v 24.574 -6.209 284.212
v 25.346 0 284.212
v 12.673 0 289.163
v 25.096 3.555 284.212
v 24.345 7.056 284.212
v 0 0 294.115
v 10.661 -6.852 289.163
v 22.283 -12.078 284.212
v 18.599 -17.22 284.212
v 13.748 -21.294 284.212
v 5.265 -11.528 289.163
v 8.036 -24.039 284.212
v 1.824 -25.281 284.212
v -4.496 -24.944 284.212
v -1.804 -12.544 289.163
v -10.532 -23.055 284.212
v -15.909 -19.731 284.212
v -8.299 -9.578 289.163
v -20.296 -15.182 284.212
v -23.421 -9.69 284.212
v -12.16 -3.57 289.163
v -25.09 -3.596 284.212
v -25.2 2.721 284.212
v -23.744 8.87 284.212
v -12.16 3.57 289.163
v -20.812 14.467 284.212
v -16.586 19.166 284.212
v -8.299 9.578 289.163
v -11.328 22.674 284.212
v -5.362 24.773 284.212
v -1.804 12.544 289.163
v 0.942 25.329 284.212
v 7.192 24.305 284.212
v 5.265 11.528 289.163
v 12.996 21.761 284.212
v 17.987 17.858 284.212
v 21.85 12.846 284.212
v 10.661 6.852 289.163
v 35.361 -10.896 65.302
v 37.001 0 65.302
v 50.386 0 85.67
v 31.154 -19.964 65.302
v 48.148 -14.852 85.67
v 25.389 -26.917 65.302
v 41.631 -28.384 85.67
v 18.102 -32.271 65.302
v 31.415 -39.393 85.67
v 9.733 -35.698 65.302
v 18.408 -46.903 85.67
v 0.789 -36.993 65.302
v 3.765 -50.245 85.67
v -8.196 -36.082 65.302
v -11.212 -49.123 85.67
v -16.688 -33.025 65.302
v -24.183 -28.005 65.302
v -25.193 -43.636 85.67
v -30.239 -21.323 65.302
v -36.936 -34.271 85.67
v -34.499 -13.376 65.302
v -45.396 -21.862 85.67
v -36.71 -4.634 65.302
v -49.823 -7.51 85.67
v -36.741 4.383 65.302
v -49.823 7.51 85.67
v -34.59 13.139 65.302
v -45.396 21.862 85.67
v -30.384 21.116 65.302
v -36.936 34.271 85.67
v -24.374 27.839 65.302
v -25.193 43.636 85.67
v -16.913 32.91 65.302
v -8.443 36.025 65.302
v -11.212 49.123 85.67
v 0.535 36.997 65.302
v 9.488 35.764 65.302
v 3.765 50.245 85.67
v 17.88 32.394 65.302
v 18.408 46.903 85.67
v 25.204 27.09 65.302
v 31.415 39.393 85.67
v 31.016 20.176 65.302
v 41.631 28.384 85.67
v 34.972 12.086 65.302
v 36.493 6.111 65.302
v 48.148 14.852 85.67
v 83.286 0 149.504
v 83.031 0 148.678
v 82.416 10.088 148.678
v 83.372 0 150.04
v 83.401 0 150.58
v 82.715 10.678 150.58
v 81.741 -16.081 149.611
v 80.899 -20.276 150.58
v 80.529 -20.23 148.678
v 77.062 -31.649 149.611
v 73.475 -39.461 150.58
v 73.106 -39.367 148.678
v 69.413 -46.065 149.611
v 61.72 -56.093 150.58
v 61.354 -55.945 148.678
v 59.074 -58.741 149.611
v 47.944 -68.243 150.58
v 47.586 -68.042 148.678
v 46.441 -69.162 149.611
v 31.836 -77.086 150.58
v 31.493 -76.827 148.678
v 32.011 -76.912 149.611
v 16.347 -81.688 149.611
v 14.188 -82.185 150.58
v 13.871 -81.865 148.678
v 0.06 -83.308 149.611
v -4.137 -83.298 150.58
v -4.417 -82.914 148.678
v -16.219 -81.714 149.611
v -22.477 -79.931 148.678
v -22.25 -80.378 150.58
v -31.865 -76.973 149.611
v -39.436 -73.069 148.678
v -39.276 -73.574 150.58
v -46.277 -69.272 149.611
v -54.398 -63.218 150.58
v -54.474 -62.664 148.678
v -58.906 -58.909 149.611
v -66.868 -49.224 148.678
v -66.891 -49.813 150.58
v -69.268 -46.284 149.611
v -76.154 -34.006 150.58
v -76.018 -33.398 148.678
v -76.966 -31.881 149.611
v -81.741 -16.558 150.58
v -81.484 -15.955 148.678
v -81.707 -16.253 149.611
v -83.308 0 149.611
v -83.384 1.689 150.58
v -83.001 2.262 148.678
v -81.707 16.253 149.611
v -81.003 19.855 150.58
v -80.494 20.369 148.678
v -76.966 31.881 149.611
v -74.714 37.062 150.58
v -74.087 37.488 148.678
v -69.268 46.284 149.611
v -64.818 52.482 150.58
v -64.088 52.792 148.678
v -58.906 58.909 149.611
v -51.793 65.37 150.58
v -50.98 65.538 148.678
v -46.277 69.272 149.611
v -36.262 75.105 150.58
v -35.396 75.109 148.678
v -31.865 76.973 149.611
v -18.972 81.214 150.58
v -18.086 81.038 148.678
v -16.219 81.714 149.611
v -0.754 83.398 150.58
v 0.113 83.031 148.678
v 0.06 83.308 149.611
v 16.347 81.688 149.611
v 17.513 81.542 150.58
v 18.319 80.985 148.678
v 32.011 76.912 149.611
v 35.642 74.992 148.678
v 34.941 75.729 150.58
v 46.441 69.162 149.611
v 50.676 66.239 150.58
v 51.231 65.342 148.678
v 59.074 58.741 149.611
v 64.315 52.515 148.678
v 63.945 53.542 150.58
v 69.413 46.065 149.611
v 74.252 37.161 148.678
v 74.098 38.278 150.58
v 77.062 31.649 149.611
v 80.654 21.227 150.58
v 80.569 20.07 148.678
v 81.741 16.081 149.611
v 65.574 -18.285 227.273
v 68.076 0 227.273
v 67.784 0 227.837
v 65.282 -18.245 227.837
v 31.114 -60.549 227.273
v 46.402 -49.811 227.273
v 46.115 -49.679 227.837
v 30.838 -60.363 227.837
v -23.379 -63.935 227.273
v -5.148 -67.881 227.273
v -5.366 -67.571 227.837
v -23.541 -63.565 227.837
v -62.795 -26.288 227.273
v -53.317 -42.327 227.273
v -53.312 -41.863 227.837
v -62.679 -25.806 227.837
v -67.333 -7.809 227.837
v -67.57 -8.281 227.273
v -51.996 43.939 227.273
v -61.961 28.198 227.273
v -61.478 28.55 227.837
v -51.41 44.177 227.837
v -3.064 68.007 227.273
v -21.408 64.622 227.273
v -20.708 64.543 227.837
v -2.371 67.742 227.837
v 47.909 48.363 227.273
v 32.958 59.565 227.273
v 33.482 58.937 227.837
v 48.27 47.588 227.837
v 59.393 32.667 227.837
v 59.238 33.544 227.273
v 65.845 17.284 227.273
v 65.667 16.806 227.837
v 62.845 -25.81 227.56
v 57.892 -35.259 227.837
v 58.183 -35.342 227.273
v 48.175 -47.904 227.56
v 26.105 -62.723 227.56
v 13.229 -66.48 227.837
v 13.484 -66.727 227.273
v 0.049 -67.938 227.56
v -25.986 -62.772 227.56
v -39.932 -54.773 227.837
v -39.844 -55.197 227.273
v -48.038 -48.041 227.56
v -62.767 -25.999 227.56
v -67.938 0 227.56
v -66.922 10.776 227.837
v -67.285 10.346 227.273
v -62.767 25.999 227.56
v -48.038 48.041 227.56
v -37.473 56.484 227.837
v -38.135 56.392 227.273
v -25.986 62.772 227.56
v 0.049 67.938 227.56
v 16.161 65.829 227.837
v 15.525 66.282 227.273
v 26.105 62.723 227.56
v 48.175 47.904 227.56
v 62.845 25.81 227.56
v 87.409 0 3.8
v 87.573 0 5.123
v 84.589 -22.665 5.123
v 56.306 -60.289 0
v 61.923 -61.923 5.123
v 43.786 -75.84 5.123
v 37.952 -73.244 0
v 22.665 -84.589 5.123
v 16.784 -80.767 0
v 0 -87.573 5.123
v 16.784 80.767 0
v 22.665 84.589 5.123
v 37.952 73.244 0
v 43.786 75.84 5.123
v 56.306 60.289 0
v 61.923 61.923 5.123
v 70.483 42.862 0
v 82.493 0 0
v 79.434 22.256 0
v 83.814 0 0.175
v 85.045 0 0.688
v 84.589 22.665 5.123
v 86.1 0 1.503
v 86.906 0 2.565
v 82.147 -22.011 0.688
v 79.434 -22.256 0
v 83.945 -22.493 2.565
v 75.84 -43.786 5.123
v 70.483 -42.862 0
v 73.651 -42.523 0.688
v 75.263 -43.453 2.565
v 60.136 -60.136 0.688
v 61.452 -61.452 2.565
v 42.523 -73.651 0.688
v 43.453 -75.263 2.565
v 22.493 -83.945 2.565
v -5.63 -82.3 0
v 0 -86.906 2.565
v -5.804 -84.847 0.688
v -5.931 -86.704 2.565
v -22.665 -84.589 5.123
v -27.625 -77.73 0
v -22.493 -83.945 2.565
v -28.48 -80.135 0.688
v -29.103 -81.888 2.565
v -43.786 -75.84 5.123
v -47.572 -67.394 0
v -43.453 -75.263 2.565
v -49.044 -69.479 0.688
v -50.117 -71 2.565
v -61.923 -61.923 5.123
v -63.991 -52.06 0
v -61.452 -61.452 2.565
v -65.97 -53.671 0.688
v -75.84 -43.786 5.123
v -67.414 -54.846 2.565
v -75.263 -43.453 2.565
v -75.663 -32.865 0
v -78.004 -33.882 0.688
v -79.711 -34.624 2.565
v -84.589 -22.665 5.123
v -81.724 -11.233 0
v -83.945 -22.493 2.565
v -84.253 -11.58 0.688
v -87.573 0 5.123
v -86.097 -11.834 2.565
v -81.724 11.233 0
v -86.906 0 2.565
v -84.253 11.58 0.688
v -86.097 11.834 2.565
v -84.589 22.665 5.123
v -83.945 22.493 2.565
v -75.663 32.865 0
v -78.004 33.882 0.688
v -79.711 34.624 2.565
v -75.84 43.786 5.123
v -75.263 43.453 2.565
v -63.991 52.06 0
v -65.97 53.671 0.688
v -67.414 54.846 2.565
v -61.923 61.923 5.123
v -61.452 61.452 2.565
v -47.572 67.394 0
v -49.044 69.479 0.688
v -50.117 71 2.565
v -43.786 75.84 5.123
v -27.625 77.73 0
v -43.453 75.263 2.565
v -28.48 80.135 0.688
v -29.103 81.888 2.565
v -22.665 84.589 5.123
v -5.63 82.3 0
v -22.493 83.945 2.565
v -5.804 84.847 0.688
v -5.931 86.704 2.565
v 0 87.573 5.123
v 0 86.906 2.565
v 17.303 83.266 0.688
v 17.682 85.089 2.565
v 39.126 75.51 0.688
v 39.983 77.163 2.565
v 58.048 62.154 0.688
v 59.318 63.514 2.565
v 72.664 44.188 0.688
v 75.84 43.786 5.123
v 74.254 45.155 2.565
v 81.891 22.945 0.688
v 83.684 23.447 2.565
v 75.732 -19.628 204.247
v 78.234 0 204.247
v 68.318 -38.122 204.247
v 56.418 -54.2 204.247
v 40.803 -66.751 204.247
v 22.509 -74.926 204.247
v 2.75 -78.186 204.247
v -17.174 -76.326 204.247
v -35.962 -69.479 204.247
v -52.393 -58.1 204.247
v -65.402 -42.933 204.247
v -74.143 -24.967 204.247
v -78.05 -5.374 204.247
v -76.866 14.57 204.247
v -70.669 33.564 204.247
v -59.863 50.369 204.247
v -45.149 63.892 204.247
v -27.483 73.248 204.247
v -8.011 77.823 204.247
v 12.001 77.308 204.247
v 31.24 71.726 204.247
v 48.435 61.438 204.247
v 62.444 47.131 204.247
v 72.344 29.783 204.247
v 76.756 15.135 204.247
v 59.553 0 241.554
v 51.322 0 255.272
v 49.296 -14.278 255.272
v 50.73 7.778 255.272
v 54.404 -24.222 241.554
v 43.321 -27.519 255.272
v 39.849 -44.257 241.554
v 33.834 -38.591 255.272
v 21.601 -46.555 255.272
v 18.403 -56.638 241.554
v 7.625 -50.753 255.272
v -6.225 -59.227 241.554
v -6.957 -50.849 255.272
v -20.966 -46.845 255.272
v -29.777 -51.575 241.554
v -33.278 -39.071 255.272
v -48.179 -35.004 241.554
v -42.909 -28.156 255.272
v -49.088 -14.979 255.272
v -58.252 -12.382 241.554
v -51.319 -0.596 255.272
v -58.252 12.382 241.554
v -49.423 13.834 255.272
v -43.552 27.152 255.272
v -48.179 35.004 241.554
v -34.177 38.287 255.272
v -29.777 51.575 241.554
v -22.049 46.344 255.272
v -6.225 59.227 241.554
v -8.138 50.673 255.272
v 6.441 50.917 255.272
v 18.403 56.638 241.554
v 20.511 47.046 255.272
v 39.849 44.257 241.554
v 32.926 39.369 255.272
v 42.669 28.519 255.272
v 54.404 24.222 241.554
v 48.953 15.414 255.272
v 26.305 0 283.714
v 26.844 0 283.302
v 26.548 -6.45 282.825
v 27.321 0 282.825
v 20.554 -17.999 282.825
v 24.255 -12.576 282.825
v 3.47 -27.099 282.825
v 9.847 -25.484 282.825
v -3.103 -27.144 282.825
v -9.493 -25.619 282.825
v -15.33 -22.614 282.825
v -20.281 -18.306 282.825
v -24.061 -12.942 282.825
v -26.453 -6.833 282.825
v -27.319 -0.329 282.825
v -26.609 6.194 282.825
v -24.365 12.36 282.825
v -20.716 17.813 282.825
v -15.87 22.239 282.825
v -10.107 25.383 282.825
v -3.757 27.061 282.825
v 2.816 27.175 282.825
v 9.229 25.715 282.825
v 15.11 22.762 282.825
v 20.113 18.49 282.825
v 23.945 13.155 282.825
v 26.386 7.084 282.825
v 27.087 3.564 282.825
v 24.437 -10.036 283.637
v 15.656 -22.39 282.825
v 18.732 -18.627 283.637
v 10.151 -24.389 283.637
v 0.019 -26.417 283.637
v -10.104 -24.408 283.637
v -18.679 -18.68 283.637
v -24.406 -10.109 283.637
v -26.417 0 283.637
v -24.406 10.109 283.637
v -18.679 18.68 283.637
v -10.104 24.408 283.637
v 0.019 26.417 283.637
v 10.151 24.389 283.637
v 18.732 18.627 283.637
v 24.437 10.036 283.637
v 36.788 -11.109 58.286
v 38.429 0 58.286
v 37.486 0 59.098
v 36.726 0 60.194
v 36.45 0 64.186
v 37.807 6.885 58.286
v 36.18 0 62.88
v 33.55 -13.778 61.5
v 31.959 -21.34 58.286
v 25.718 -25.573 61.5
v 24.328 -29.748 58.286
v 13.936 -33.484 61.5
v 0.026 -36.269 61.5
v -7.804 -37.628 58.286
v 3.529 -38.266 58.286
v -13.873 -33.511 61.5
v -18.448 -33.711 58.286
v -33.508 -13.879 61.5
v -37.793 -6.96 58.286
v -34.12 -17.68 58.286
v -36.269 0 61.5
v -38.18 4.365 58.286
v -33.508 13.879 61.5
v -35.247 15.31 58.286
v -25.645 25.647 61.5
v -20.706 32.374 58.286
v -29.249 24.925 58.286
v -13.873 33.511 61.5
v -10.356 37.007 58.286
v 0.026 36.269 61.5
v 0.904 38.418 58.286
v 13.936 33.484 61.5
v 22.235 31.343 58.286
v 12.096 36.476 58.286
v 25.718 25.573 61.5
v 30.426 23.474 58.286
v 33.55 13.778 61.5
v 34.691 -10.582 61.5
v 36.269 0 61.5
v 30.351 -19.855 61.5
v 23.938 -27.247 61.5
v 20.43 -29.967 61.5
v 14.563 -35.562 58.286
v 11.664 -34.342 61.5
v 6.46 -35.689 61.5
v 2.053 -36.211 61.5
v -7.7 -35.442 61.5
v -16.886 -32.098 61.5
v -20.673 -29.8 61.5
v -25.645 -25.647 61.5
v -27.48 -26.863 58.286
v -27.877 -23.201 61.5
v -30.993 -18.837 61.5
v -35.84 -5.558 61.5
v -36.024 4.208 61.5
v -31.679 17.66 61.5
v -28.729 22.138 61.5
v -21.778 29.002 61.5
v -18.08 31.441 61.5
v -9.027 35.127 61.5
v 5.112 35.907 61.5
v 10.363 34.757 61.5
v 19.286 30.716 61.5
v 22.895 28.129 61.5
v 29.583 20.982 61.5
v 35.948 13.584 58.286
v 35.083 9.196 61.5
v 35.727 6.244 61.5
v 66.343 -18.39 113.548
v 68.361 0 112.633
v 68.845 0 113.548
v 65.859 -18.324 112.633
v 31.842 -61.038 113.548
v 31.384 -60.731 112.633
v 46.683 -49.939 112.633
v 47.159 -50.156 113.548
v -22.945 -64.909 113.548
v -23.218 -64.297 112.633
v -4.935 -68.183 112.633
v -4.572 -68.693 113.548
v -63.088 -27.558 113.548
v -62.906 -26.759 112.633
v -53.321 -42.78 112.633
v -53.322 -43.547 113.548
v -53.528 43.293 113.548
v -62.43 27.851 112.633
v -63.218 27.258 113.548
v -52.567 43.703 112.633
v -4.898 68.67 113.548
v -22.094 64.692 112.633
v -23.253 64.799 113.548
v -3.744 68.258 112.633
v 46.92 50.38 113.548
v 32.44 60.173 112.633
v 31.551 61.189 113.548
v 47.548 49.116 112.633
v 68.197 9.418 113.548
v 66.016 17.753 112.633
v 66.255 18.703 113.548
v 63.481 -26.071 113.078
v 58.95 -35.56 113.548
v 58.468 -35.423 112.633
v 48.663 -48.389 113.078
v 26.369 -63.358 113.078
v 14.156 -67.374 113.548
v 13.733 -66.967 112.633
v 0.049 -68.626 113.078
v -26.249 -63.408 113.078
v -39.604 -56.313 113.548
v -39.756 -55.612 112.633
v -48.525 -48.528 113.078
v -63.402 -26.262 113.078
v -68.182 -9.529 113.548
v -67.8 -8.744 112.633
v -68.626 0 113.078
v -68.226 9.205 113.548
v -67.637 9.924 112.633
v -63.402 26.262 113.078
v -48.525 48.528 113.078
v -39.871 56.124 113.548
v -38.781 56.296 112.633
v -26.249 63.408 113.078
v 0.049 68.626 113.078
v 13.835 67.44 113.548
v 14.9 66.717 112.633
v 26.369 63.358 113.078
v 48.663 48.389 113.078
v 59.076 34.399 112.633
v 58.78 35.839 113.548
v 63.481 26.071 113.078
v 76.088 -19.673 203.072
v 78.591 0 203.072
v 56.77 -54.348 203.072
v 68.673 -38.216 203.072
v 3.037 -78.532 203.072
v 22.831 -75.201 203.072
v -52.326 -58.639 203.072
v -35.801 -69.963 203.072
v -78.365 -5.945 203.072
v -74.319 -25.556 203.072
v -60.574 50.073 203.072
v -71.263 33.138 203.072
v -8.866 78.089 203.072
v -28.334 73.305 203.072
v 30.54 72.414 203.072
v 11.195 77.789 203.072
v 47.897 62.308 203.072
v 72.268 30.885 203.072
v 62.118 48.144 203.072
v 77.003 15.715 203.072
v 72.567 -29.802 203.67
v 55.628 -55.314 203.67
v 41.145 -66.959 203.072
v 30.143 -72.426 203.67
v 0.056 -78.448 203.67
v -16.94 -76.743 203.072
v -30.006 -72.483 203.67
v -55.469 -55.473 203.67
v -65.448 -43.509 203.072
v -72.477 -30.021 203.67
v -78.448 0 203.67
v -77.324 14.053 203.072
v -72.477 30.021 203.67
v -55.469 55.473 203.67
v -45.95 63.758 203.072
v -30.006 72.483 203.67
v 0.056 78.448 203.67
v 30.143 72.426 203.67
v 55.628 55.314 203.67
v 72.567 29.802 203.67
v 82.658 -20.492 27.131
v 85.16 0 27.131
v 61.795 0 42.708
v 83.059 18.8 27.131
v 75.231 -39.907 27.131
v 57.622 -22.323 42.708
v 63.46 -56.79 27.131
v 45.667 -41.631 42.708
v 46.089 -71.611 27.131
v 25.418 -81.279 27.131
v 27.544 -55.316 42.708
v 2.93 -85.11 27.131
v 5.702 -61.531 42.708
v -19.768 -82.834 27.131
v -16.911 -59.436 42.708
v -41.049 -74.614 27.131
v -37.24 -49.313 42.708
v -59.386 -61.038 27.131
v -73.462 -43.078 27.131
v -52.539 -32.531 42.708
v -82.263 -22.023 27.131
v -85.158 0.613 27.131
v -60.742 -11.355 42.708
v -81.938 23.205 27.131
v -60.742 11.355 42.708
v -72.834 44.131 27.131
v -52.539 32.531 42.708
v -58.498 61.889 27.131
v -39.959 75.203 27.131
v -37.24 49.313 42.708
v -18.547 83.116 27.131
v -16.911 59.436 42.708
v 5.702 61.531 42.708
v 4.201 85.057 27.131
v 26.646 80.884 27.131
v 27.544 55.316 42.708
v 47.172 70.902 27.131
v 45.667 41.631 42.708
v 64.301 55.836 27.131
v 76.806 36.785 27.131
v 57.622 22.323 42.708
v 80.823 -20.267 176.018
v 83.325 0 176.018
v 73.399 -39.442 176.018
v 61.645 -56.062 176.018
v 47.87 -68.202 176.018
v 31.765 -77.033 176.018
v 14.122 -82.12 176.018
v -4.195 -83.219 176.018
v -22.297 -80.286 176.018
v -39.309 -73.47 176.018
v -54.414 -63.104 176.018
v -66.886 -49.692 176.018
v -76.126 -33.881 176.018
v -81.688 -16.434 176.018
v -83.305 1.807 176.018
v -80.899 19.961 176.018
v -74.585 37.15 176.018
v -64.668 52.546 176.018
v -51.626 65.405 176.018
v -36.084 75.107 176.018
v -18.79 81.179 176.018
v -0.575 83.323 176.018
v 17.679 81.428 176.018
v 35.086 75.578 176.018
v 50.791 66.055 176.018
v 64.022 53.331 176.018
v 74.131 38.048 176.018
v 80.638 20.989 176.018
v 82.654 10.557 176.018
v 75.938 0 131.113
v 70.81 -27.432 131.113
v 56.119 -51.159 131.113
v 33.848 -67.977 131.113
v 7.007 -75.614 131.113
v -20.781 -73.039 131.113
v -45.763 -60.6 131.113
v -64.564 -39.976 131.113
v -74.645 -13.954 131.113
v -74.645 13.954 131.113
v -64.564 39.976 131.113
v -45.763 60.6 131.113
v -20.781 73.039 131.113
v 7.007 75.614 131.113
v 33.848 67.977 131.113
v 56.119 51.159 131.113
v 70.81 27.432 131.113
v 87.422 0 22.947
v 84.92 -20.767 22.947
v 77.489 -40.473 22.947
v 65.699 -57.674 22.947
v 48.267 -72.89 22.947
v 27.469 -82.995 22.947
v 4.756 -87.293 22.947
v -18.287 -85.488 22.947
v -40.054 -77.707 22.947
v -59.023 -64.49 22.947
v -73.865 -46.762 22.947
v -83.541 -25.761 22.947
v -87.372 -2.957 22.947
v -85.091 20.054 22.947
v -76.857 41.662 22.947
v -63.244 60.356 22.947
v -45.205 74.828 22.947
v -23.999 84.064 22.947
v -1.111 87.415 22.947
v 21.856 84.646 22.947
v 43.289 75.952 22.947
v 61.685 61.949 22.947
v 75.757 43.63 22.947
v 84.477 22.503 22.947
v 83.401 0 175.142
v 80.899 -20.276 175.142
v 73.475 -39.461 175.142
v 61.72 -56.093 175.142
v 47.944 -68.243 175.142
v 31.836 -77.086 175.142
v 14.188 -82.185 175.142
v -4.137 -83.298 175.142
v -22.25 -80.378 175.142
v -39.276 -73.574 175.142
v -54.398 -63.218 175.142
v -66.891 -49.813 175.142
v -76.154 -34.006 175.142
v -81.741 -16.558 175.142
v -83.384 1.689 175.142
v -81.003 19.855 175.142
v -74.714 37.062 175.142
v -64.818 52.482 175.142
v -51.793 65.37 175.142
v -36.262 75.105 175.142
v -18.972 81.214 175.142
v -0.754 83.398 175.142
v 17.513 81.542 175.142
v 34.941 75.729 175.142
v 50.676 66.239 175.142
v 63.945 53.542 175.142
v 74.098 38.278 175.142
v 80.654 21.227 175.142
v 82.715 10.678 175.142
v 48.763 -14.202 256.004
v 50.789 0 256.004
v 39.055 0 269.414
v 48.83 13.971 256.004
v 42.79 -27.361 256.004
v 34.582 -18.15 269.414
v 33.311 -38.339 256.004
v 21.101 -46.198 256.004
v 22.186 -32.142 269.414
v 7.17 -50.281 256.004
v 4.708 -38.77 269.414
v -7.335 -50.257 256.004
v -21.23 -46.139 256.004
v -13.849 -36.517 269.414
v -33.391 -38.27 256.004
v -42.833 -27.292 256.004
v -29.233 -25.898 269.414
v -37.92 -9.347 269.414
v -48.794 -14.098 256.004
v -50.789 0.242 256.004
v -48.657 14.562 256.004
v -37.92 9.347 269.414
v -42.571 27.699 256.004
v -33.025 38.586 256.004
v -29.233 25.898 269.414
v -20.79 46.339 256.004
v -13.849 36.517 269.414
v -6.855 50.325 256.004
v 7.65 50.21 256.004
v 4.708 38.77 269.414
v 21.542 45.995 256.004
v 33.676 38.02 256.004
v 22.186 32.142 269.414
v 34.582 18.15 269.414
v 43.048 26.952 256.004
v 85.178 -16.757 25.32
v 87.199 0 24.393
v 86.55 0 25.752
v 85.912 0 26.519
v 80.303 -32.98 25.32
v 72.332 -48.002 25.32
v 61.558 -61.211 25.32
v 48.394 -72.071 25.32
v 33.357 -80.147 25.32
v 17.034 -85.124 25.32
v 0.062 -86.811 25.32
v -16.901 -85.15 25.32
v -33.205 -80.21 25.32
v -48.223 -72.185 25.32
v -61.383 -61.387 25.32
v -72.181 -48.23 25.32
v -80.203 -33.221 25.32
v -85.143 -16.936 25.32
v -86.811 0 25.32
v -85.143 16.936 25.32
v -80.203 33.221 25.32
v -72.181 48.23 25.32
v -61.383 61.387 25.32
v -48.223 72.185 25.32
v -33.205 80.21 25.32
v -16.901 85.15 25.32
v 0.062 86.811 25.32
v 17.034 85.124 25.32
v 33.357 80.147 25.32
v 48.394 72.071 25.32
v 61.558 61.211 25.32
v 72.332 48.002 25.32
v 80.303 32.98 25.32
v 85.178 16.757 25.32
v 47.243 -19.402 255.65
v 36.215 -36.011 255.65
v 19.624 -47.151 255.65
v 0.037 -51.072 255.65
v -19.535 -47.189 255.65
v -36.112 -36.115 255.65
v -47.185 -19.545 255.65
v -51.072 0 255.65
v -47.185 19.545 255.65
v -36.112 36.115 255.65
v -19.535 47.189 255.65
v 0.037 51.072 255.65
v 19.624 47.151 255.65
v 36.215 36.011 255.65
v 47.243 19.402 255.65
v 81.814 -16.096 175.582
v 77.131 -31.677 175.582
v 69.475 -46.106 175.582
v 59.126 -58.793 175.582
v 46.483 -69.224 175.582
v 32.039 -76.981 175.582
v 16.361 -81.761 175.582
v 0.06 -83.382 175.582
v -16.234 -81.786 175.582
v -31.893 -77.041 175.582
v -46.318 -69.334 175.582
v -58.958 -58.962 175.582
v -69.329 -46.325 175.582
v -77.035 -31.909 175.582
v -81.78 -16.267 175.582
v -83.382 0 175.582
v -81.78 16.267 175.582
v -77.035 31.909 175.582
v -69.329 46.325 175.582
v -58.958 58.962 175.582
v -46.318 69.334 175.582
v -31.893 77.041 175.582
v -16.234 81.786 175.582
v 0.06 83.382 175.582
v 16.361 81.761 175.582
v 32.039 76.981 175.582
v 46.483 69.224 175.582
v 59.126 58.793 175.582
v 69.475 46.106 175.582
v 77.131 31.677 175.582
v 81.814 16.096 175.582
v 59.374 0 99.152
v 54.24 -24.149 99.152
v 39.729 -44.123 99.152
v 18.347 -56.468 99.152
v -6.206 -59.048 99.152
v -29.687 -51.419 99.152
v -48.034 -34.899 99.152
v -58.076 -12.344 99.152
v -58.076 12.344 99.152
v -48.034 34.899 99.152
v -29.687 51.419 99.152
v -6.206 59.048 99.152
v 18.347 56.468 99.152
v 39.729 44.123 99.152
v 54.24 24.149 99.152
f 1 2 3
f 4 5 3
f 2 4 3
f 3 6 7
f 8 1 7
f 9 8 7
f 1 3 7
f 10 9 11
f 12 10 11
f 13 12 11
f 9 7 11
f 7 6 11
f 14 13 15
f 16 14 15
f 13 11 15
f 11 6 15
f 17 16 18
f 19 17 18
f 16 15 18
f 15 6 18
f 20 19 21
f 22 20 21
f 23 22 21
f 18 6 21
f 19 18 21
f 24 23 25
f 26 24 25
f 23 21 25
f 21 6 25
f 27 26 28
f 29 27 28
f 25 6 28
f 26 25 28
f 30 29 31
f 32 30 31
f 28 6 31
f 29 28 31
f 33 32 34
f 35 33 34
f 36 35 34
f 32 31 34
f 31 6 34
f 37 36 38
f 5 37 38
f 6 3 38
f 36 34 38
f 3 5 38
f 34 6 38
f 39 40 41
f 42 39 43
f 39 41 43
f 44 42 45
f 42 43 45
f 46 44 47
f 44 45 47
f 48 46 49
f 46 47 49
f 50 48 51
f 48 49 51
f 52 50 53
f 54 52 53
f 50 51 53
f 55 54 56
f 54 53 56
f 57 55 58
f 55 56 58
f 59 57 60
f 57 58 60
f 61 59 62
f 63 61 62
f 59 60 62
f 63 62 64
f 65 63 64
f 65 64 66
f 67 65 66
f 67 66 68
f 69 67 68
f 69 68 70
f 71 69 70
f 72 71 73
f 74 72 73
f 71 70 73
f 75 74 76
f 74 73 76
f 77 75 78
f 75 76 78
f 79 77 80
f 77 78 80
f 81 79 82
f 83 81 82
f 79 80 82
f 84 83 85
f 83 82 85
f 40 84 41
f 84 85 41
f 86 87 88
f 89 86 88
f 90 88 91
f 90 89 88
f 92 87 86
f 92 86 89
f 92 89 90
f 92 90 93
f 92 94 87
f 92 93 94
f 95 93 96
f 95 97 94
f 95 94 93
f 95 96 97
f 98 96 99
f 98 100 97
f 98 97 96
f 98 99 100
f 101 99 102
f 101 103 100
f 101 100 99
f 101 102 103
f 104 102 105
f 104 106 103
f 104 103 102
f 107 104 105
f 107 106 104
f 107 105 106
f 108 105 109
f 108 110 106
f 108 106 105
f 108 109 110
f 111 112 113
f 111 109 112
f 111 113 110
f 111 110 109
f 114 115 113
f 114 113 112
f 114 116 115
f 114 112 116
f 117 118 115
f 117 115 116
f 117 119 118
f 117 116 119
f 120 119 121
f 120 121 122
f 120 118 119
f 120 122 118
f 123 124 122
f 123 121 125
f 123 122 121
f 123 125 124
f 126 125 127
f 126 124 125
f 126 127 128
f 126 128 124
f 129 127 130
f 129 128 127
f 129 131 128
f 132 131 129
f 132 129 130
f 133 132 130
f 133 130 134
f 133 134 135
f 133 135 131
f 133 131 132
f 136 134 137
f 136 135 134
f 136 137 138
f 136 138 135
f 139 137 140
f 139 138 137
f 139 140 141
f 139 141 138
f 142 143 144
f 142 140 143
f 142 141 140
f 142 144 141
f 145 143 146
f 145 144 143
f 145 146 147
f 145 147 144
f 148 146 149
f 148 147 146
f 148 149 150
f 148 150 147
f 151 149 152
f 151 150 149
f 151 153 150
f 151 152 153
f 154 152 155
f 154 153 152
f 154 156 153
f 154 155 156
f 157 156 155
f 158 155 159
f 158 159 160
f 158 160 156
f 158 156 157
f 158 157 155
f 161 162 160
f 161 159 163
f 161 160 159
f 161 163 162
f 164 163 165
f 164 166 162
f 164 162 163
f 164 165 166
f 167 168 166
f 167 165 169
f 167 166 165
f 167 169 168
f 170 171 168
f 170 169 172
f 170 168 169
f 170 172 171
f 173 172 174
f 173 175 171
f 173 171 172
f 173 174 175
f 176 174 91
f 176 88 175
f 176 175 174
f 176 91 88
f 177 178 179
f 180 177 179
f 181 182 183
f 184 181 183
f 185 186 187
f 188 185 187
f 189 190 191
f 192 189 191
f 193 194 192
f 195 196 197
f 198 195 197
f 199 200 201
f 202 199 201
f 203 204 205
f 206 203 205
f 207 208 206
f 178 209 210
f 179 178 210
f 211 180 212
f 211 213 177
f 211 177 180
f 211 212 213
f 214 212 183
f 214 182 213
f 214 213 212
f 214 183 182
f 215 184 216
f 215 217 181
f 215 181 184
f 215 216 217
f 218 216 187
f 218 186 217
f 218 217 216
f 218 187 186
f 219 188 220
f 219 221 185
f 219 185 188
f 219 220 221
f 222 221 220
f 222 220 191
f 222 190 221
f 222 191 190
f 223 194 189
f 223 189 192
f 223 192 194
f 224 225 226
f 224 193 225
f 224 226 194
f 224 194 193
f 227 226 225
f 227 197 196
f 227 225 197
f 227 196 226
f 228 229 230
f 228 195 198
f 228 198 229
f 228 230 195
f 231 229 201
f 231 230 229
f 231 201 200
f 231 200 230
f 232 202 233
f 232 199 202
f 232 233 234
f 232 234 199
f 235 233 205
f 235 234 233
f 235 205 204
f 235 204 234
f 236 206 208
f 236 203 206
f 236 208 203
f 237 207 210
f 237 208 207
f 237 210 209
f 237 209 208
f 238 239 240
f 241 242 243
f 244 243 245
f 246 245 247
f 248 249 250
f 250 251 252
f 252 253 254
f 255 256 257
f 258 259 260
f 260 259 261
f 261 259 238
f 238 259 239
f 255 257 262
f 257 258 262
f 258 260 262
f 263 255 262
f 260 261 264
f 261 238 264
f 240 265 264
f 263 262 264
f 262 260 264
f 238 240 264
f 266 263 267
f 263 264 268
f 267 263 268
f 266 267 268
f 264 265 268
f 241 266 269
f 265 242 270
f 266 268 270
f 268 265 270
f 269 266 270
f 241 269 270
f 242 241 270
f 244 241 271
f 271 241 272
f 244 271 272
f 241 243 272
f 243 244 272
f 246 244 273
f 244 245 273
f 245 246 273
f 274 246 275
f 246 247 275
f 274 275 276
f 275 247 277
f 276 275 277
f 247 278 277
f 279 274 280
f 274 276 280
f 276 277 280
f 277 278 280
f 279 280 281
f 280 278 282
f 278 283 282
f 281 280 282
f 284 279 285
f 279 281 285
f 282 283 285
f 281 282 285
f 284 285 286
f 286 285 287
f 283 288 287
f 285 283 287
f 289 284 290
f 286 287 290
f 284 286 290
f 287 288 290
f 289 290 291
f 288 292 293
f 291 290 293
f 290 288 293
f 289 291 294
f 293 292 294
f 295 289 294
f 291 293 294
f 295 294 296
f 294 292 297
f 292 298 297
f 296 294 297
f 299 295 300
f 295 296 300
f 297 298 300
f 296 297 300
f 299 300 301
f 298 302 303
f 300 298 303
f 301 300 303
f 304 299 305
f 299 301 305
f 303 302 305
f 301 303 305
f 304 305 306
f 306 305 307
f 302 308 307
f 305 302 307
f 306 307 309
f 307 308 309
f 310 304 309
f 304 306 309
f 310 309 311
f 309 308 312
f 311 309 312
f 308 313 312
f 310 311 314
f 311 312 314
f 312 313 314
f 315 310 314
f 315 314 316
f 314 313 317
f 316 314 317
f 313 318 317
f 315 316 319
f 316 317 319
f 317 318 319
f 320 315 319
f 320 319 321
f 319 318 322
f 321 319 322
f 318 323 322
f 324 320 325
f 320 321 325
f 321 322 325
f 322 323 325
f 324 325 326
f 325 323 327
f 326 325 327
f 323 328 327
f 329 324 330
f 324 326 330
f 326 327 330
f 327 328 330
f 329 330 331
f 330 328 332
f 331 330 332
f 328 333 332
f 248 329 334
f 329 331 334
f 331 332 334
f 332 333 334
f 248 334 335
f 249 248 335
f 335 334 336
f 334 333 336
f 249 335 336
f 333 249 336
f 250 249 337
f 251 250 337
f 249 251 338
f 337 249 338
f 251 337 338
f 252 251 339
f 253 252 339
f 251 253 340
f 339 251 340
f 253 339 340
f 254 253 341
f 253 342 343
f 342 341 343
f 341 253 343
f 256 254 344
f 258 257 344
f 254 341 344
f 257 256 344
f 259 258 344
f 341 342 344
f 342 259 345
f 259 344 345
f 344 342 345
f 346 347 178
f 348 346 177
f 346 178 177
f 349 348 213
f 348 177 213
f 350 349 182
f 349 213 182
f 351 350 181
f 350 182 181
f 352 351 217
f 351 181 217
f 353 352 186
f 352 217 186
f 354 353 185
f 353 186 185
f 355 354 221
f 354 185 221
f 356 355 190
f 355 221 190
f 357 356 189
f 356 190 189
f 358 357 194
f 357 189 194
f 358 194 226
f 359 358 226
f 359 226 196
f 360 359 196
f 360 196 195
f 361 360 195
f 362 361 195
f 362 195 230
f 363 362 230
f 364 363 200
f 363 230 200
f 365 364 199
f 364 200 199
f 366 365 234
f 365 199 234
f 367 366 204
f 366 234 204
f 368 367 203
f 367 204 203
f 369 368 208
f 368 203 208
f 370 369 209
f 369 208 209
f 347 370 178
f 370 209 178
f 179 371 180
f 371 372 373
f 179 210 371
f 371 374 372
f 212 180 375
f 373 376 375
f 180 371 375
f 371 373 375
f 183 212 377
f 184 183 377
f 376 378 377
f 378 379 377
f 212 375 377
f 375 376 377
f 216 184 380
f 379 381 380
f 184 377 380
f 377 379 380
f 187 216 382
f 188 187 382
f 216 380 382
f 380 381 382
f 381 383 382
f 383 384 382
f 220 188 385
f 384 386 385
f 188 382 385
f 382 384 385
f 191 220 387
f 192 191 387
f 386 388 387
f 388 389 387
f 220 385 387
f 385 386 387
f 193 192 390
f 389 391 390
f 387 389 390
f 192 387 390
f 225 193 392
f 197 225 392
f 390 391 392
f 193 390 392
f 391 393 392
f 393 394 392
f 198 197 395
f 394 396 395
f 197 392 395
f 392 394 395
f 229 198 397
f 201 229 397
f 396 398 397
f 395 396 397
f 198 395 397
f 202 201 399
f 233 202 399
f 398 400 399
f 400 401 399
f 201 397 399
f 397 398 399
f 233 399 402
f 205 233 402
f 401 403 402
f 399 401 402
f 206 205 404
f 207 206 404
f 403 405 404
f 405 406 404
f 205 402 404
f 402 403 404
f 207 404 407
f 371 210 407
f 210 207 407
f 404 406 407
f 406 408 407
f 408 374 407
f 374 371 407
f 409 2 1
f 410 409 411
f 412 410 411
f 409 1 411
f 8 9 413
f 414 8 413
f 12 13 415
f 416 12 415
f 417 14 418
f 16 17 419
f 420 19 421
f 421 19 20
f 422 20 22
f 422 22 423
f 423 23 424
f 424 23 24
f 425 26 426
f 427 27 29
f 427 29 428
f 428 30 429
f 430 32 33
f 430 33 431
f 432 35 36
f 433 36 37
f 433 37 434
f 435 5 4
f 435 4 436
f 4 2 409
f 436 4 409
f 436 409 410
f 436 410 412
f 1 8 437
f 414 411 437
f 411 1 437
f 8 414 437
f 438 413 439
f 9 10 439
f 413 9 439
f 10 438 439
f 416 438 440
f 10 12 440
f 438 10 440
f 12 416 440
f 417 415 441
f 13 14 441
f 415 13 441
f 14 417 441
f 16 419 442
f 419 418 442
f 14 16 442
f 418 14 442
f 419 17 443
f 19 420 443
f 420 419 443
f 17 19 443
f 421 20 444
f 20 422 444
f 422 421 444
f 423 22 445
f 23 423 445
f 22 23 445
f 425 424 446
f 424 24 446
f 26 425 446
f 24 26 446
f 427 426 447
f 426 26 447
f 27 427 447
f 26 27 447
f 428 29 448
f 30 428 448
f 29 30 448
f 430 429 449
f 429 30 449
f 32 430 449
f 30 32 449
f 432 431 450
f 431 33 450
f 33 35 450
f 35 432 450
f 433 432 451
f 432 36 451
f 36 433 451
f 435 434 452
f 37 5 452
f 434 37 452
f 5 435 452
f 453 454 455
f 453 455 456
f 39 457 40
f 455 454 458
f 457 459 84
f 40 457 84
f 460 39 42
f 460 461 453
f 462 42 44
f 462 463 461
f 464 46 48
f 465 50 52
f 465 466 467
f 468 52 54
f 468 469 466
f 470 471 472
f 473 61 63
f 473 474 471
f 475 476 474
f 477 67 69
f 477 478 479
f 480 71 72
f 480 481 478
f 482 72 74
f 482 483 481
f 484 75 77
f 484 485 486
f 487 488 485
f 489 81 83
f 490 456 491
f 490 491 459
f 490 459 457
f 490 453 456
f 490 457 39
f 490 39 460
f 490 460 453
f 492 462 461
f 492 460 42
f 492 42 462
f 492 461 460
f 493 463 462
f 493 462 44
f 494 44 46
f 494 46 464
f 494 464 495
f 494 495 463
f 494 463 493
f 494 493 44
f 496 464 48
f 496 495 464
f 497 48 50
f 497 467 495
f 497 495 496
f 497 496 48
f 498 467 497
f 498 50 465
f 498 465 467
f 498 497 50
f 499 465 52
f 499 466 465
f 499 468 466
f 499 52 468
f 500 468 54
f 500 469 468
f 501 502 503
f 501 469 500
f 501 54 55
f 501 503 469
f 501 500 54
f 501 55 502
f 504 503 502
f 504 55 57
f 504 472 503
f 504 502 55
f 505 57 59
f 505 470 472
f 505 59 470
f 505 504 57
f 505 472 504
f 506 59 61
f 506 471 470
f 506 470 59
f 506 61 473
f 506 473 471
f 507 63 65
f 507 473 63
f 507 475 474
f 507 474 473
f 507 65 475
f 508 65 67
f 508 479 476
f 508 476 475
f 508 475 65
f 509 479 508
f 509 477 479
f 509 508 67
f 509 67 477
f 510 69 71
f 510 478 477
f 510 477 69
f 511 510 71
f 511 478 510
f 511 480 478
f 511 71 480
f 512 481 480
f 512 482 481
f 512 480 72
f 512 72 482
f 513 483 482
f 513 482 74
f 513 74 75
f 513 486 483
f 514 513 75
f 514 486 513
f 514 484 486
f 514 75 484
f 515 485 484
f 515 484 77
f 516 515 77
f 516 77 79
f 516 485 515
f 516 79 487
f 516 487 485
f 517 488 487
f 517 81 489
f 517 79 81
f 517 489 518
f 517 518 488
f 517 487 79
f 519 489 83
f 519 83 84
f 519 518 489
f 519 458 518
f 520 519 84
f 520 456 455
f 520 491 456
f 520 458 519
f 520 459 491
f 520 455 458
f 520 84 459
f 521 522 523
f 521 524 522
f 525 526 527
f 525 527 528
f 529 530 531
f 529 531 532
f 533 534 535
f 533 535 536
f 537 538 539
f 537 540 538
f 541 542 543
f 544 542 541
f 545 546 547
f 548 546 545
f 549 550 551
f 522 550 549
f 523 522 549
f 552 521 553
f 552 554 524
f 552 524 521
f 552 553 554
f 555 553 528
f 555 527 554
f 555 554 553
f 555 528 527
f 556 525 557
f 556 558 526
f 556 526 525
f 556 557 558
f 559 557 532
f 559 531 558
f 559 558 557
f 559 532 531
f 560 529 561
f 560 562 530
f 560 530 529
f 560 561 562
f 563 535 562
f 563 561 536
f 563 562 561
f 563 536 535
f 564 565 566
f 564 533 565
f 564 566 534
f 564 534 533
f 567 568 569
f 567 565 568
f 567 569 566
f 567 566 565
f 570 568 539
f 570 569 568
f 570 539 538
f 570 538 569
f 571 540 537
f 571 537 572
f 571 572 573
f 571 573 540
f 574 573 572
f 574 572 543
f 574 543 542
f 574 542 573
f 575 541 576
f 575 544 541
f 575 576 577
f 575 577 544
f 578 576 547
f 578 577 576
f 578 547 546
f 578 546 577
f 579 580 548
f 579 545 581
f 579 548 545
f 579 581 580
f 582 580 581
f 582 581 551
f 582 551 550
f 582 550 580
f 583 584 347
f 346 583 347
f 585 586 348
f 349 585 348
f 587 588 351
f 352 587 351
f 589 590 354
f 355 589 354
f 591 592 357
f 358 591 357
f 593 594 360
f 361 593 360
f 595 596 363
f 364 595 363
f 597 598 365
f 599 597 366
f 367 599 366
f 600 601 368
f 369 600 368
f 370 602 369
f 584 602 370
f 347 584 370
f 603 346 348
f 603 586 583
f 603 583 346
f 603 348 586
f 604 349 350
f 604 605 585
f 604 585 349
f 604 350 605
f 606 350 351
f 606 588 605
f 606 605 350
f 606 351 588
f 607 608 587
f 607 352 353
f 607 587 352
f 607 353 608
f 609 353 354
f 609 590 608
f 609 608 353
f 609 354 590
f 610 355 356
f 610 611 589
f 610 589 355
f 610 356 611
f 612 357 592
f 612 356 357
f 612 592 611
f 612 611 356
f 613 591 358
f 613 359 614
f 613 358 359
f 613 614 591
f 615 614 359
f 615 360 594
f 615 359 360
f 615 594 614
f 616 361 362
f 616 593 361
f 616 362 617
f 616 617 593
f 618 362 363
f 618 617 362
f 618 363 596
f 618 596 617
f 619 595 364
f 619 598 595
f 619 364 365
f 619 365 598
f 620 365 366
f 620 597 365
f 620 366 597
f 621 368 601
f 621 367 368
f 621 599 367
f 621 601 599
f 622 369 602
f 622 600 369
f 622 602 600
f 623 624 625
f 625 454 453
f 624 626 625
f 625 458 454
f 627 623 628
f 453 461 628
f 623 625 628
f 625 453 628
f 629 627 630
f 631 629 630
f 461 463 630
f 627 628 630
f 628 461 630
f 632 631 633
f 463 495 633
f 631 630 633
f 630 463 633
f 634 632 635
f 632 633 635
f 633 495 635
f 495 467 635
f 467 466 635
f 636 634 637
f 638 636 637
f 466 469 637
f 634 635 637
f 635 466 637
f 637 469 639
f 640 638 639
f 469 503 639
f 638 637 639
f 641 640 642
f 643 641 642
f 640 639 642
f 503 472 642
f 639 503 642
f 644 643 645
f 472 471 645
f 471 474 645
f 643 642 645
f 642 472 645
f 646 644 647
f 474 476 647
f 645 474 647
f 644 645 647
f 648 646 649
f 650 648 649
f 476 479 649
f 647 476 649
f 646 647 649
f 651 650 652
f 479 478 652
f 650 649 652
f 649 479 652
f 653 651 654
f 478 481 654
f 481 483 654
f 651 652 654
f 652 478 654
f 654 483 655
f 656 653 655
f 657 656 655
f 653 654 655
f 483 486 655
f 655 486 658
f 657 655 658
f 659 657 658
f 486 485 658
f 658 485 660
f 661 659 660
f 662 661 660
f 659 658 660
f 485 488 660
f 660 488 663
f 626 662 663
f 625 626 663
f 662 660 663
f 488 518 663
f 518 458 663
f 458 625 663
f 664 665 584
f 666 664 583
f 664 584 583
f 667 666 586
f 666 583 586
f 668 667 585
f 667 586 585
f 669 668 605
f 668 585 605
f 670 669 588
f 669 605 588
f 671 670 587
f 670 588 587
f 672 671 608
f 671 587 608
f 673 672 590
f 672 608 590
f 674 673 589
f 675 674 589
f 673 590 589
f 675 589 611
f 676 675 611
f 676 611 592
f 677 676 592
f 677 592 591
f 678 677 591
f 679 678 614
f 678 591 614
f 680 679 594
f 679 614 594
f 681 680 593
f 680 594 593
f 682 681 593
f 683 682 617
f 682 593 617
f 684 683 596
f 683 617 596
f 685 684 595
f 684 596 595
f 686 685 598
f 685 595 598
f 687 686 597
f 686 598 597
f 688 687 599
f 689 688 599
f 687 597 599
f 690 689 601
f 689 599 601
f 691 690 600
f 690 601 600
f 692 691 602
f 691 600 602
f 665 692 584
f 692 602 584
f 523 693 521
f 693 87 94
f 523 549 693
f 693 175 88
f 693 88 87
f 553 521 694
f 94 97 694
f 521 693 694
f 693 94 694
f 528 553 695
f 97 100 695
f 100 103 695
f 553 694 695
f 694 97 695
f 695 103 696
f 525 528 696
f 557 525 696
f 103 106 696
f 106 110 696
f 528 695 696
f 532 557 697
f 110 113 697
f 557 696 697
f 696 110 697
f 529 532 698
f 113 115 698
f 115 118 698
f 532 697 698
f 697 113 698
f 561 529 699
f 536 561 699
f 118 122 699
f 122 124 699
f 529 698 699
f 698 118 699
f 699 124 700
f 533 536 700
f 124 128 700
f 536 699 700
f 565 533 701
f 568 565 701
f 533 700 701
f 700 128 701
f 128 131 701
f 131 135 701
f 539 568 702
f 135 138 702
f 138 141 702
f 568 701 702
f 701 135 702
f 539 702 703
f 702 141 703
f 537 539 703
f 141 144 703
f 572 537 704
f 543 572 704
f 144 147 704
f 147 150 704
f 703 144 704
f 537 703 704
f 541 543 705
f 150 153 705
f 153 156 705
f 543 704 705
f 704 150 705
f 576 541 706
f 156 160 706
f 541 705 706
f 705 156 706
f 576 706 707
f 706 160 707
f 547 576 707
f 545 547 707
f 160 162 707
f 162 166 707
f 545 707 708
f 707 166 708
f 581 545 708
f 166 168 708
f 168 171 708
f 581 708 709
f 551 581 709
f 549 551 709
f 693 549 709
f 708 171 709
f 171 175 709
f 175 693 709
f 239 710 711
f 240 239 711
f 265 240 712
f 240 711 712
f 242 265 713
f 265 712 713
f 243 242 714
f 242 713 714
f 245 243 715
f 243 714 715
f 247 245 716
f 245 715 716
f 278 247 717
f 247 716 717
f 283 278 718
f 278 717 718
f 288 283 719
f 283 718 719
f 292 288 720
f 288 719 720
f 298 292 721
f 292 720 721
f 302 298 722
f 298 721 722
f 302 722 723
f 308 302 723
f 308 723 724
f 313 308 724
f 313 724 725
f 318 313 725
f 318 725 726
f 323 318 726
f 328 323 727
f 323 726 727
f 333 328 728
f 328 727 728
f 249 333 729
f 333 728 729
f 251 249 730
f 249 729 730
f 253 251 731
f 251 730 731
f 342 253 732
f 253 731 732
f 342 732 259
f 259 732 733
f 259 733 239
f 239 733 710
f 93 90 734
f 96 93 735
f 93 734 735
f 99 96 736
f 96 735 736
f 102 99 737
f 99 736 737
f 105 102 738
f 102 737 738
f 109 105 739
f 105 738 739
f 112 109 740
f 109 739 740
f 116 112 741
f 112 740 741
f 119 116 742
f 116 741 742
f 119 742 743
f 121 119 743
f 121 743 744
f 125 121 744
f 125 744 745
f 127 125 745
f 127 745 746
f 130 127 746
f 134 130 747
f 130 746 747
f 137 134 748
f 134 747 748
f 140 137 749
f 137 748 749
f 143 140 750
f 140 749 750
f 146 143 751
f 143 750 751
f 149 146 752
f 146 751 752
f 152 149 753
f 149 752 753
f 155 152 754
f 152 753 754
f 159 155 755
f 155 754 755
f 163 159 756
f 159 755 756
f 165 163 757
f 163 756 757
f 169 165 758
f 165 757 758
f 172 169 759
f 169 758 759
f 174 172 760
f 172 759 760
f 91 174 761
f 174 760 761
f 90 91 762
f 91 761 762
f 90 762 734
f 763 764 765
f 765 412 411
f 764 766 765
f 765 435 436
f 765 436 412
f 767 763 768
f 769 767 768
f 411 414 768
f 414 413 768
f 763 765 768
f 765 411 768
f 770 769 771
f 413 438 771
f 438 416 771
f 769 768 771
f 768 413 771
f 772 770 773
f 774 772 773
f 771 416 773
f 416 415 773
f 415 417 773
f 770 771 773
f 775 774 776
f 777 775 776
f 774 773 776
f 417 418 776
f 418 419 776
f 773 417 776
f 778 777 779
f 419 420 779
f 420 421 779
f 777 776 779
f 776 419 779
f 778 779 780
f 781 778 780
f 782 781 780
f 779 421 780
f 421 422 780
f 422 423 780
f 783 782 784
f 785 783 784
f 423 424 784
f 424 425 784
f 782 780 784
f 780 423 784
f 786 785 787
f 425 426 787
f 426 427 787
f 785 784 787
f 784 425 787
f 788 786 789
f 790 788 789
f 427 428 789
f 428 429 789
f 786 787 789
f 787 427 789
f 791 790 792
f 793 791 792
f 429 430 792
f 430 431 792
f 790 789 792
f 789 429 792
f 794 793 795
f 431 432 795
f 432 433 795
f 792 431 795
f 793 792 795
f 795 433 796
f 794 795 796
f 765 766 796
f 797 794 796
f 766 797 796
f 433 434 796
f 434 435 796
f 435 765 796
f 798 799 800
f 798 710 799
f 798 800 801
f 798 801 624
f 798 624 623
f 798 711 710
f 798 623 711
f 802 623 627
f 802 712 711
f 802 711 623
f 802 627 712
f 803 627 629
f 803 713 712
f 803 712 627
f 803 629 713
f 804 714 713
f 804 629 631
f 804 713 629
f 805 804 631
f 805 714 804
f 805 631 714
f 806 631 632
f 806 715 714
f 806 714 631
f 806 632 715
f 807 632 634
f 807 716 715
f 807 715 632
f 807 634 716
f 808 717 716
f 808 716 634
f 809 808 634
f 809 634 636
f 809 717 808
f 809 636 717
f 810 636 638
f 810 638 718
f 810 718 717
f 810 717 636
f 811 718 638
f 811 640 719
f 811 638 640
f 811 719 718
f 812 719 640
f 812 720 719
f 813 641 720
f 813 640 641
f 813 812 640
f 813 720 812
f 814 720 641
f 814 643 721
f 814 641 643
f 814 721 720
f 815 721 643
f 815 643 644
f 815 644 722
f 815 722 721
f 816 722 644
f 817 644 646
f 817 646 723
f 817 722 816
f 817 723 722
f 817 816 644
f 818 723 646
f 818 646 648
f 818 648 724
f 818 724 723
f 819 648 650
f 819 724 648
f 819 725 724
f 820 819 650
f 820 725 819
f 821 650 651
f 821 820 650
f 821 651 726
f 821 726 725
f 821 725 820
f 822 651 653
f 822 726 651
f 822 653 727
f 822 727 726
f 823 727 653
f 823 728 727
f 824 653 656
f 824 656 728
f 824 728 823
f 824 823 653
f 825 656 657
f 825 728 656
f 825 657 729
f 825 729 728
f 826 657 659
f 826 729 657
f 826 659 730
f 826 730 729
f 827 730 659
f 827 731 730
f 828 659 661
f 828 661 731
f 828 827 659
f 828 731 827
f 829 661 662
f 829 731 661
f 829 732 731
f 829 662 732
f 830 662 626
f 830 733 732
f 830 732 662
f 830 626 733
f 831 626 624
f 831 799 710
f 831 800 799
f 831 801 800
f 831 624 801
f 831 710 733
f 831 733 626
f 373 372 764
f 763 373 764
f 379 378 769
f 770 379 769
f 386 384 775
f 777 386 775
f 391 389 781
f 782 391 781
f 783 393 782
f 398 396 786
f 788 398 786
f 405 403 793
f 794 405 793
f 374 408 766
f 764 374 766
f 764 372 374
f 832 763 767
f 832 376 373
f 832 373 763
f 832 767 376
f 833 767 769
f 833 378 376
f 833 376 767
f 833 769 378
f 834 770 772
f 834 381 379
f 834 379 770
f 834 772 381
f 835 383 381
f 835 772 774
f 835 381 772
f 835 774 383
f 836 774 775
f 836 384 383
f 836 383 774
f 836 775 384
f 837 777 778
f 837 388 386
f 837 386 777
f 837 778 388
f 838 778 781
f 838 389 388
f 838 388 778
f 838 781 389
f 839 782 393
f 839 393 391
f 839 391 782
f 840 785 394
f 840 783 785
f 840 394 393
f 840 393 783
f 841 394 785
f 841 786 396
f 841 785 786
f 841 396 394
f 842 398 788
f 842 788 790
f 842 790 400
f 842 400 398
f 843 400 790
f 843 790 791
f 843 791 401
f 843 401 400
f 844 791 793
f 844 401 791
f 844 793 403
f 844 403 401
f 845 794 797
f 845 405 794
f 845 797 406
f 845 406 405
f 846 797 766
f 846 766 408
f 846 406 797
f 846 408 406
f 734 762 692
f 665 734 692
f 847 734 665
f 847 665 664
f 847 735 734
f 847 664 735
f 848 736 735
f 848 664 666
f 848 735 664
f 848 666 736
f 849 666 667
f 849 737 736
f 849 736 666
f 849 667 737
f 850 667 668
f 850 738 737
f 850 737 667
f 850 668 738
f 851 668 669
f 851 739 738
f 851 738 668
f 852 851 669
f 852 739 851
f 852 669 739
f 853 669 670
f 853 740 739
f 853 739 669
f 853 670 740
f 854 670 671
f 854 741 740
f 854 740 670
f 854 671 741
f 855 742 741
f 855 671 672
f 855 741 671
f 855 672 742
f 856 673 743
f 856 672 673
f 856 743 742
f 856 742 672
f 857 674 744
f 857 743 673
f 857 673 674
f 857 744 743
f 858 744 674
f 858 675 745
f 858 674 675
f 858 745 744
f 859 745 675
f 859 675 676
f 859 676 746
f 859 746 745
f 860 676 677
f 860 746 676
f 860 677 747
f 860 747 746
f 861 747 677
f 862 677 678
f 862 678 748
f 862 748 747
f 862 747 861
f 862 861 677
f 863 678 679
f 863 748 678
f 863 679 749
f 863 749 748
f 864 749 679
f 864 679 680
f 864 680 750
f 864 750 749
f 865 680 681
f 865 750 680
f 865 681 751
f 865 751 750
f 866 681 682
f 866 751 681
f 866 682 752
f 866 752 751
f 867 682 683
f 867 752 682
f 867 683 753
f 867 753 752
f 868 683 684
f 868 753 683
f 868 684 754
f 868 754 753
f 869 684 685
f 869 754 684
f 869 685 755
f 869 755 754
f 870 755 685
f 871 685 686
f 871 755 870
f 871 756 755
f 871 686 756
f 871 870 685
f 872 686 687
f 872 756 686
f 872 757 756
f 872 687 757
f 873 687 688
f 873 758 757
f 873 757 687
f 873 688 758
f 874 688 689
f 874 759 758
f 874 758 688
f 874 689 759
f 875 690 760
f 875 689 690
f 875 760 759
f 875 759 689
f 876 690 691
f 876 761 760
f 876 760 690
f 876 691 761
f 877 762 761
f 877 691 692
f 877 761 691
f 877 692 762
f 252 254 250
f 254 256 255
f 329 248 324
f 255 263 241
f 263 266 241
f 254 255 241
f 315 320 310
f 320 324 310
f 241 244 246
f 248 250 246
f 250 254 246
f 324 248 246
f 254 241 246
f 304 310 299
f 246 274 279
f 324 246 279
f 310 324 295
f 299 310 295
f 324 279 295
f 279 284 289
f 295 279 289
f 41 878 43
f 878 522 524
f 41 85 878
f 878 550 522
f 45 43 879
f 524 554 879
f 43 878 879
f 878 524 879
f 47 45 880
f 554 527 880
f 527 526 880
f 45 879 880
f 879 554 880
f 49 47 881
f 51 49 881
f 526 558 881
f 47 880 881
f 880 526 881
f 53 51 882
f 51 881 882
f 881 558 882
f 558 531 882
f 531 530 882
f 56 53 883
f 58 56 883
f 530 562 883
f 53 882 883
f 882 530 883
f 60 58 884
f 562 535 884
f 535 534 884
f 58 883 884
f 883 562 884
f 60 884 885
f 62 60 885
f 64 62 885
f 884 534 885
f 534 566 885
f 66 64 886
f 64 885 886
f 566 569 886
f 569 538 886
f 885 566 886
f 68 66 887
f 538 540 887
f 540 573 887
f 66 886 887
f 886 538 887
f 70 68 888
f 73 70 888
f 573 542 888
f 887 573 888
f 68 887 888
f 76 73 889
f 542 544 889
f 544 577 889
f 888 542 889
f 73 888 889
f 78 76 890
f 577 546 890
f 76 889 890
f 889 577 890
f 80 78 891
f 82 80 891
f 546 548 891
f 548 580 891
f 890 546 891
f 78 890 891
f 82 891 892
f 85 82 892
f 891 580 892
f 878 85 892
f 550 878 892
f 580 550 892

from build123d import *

# Parameters (mm, degrees)
F2_R = 5.08


with BuildPart() as f1:
    # F0 (on Front) → F1 (revolve)
    with BuildSketch(Plane.XZ):
        Polygon((26.503066, 283.759713), (0, 294.11453), (0, 0), (87.615736, 0), (87.39959, 25.638381), (34.229953, 61.084811), (50.386176, 85.670367), (68.649732, 113.065697), (83.401062, 149.592802), (83.401062, 175.583258), (78.483954, 203.681022), (67.947291, 227.564156), (51.08862, 255.661905), align=None)
    revolve(axis=Axis((0, 0, 147.057265), (0, 0, -1)))

    # F2
    f2_edges = [f1.edges().sort_by_distance(p)[0] for p in [
        (-51.08862, 0, 255.661905),
        (-67.947291, 0, 227.564156),
        (-83.401062, 0, 175.583258),
        (-78.483954, 0, 203.681022),
        (-83.401062, 0, 149.592802),
        (-26.503066, 0, 283.759713),
        (-68.649732, 0, 113.065697),
        (-50.386176, 0, 85.670367),
        (-34.229953, 0, 61.084811),
        (-87.39959, 0, 25.638381),
        (-87.615736, 0, 0),
    ]]
    fillet(f2_edges, radius=F2_R)


solid = f1.part
